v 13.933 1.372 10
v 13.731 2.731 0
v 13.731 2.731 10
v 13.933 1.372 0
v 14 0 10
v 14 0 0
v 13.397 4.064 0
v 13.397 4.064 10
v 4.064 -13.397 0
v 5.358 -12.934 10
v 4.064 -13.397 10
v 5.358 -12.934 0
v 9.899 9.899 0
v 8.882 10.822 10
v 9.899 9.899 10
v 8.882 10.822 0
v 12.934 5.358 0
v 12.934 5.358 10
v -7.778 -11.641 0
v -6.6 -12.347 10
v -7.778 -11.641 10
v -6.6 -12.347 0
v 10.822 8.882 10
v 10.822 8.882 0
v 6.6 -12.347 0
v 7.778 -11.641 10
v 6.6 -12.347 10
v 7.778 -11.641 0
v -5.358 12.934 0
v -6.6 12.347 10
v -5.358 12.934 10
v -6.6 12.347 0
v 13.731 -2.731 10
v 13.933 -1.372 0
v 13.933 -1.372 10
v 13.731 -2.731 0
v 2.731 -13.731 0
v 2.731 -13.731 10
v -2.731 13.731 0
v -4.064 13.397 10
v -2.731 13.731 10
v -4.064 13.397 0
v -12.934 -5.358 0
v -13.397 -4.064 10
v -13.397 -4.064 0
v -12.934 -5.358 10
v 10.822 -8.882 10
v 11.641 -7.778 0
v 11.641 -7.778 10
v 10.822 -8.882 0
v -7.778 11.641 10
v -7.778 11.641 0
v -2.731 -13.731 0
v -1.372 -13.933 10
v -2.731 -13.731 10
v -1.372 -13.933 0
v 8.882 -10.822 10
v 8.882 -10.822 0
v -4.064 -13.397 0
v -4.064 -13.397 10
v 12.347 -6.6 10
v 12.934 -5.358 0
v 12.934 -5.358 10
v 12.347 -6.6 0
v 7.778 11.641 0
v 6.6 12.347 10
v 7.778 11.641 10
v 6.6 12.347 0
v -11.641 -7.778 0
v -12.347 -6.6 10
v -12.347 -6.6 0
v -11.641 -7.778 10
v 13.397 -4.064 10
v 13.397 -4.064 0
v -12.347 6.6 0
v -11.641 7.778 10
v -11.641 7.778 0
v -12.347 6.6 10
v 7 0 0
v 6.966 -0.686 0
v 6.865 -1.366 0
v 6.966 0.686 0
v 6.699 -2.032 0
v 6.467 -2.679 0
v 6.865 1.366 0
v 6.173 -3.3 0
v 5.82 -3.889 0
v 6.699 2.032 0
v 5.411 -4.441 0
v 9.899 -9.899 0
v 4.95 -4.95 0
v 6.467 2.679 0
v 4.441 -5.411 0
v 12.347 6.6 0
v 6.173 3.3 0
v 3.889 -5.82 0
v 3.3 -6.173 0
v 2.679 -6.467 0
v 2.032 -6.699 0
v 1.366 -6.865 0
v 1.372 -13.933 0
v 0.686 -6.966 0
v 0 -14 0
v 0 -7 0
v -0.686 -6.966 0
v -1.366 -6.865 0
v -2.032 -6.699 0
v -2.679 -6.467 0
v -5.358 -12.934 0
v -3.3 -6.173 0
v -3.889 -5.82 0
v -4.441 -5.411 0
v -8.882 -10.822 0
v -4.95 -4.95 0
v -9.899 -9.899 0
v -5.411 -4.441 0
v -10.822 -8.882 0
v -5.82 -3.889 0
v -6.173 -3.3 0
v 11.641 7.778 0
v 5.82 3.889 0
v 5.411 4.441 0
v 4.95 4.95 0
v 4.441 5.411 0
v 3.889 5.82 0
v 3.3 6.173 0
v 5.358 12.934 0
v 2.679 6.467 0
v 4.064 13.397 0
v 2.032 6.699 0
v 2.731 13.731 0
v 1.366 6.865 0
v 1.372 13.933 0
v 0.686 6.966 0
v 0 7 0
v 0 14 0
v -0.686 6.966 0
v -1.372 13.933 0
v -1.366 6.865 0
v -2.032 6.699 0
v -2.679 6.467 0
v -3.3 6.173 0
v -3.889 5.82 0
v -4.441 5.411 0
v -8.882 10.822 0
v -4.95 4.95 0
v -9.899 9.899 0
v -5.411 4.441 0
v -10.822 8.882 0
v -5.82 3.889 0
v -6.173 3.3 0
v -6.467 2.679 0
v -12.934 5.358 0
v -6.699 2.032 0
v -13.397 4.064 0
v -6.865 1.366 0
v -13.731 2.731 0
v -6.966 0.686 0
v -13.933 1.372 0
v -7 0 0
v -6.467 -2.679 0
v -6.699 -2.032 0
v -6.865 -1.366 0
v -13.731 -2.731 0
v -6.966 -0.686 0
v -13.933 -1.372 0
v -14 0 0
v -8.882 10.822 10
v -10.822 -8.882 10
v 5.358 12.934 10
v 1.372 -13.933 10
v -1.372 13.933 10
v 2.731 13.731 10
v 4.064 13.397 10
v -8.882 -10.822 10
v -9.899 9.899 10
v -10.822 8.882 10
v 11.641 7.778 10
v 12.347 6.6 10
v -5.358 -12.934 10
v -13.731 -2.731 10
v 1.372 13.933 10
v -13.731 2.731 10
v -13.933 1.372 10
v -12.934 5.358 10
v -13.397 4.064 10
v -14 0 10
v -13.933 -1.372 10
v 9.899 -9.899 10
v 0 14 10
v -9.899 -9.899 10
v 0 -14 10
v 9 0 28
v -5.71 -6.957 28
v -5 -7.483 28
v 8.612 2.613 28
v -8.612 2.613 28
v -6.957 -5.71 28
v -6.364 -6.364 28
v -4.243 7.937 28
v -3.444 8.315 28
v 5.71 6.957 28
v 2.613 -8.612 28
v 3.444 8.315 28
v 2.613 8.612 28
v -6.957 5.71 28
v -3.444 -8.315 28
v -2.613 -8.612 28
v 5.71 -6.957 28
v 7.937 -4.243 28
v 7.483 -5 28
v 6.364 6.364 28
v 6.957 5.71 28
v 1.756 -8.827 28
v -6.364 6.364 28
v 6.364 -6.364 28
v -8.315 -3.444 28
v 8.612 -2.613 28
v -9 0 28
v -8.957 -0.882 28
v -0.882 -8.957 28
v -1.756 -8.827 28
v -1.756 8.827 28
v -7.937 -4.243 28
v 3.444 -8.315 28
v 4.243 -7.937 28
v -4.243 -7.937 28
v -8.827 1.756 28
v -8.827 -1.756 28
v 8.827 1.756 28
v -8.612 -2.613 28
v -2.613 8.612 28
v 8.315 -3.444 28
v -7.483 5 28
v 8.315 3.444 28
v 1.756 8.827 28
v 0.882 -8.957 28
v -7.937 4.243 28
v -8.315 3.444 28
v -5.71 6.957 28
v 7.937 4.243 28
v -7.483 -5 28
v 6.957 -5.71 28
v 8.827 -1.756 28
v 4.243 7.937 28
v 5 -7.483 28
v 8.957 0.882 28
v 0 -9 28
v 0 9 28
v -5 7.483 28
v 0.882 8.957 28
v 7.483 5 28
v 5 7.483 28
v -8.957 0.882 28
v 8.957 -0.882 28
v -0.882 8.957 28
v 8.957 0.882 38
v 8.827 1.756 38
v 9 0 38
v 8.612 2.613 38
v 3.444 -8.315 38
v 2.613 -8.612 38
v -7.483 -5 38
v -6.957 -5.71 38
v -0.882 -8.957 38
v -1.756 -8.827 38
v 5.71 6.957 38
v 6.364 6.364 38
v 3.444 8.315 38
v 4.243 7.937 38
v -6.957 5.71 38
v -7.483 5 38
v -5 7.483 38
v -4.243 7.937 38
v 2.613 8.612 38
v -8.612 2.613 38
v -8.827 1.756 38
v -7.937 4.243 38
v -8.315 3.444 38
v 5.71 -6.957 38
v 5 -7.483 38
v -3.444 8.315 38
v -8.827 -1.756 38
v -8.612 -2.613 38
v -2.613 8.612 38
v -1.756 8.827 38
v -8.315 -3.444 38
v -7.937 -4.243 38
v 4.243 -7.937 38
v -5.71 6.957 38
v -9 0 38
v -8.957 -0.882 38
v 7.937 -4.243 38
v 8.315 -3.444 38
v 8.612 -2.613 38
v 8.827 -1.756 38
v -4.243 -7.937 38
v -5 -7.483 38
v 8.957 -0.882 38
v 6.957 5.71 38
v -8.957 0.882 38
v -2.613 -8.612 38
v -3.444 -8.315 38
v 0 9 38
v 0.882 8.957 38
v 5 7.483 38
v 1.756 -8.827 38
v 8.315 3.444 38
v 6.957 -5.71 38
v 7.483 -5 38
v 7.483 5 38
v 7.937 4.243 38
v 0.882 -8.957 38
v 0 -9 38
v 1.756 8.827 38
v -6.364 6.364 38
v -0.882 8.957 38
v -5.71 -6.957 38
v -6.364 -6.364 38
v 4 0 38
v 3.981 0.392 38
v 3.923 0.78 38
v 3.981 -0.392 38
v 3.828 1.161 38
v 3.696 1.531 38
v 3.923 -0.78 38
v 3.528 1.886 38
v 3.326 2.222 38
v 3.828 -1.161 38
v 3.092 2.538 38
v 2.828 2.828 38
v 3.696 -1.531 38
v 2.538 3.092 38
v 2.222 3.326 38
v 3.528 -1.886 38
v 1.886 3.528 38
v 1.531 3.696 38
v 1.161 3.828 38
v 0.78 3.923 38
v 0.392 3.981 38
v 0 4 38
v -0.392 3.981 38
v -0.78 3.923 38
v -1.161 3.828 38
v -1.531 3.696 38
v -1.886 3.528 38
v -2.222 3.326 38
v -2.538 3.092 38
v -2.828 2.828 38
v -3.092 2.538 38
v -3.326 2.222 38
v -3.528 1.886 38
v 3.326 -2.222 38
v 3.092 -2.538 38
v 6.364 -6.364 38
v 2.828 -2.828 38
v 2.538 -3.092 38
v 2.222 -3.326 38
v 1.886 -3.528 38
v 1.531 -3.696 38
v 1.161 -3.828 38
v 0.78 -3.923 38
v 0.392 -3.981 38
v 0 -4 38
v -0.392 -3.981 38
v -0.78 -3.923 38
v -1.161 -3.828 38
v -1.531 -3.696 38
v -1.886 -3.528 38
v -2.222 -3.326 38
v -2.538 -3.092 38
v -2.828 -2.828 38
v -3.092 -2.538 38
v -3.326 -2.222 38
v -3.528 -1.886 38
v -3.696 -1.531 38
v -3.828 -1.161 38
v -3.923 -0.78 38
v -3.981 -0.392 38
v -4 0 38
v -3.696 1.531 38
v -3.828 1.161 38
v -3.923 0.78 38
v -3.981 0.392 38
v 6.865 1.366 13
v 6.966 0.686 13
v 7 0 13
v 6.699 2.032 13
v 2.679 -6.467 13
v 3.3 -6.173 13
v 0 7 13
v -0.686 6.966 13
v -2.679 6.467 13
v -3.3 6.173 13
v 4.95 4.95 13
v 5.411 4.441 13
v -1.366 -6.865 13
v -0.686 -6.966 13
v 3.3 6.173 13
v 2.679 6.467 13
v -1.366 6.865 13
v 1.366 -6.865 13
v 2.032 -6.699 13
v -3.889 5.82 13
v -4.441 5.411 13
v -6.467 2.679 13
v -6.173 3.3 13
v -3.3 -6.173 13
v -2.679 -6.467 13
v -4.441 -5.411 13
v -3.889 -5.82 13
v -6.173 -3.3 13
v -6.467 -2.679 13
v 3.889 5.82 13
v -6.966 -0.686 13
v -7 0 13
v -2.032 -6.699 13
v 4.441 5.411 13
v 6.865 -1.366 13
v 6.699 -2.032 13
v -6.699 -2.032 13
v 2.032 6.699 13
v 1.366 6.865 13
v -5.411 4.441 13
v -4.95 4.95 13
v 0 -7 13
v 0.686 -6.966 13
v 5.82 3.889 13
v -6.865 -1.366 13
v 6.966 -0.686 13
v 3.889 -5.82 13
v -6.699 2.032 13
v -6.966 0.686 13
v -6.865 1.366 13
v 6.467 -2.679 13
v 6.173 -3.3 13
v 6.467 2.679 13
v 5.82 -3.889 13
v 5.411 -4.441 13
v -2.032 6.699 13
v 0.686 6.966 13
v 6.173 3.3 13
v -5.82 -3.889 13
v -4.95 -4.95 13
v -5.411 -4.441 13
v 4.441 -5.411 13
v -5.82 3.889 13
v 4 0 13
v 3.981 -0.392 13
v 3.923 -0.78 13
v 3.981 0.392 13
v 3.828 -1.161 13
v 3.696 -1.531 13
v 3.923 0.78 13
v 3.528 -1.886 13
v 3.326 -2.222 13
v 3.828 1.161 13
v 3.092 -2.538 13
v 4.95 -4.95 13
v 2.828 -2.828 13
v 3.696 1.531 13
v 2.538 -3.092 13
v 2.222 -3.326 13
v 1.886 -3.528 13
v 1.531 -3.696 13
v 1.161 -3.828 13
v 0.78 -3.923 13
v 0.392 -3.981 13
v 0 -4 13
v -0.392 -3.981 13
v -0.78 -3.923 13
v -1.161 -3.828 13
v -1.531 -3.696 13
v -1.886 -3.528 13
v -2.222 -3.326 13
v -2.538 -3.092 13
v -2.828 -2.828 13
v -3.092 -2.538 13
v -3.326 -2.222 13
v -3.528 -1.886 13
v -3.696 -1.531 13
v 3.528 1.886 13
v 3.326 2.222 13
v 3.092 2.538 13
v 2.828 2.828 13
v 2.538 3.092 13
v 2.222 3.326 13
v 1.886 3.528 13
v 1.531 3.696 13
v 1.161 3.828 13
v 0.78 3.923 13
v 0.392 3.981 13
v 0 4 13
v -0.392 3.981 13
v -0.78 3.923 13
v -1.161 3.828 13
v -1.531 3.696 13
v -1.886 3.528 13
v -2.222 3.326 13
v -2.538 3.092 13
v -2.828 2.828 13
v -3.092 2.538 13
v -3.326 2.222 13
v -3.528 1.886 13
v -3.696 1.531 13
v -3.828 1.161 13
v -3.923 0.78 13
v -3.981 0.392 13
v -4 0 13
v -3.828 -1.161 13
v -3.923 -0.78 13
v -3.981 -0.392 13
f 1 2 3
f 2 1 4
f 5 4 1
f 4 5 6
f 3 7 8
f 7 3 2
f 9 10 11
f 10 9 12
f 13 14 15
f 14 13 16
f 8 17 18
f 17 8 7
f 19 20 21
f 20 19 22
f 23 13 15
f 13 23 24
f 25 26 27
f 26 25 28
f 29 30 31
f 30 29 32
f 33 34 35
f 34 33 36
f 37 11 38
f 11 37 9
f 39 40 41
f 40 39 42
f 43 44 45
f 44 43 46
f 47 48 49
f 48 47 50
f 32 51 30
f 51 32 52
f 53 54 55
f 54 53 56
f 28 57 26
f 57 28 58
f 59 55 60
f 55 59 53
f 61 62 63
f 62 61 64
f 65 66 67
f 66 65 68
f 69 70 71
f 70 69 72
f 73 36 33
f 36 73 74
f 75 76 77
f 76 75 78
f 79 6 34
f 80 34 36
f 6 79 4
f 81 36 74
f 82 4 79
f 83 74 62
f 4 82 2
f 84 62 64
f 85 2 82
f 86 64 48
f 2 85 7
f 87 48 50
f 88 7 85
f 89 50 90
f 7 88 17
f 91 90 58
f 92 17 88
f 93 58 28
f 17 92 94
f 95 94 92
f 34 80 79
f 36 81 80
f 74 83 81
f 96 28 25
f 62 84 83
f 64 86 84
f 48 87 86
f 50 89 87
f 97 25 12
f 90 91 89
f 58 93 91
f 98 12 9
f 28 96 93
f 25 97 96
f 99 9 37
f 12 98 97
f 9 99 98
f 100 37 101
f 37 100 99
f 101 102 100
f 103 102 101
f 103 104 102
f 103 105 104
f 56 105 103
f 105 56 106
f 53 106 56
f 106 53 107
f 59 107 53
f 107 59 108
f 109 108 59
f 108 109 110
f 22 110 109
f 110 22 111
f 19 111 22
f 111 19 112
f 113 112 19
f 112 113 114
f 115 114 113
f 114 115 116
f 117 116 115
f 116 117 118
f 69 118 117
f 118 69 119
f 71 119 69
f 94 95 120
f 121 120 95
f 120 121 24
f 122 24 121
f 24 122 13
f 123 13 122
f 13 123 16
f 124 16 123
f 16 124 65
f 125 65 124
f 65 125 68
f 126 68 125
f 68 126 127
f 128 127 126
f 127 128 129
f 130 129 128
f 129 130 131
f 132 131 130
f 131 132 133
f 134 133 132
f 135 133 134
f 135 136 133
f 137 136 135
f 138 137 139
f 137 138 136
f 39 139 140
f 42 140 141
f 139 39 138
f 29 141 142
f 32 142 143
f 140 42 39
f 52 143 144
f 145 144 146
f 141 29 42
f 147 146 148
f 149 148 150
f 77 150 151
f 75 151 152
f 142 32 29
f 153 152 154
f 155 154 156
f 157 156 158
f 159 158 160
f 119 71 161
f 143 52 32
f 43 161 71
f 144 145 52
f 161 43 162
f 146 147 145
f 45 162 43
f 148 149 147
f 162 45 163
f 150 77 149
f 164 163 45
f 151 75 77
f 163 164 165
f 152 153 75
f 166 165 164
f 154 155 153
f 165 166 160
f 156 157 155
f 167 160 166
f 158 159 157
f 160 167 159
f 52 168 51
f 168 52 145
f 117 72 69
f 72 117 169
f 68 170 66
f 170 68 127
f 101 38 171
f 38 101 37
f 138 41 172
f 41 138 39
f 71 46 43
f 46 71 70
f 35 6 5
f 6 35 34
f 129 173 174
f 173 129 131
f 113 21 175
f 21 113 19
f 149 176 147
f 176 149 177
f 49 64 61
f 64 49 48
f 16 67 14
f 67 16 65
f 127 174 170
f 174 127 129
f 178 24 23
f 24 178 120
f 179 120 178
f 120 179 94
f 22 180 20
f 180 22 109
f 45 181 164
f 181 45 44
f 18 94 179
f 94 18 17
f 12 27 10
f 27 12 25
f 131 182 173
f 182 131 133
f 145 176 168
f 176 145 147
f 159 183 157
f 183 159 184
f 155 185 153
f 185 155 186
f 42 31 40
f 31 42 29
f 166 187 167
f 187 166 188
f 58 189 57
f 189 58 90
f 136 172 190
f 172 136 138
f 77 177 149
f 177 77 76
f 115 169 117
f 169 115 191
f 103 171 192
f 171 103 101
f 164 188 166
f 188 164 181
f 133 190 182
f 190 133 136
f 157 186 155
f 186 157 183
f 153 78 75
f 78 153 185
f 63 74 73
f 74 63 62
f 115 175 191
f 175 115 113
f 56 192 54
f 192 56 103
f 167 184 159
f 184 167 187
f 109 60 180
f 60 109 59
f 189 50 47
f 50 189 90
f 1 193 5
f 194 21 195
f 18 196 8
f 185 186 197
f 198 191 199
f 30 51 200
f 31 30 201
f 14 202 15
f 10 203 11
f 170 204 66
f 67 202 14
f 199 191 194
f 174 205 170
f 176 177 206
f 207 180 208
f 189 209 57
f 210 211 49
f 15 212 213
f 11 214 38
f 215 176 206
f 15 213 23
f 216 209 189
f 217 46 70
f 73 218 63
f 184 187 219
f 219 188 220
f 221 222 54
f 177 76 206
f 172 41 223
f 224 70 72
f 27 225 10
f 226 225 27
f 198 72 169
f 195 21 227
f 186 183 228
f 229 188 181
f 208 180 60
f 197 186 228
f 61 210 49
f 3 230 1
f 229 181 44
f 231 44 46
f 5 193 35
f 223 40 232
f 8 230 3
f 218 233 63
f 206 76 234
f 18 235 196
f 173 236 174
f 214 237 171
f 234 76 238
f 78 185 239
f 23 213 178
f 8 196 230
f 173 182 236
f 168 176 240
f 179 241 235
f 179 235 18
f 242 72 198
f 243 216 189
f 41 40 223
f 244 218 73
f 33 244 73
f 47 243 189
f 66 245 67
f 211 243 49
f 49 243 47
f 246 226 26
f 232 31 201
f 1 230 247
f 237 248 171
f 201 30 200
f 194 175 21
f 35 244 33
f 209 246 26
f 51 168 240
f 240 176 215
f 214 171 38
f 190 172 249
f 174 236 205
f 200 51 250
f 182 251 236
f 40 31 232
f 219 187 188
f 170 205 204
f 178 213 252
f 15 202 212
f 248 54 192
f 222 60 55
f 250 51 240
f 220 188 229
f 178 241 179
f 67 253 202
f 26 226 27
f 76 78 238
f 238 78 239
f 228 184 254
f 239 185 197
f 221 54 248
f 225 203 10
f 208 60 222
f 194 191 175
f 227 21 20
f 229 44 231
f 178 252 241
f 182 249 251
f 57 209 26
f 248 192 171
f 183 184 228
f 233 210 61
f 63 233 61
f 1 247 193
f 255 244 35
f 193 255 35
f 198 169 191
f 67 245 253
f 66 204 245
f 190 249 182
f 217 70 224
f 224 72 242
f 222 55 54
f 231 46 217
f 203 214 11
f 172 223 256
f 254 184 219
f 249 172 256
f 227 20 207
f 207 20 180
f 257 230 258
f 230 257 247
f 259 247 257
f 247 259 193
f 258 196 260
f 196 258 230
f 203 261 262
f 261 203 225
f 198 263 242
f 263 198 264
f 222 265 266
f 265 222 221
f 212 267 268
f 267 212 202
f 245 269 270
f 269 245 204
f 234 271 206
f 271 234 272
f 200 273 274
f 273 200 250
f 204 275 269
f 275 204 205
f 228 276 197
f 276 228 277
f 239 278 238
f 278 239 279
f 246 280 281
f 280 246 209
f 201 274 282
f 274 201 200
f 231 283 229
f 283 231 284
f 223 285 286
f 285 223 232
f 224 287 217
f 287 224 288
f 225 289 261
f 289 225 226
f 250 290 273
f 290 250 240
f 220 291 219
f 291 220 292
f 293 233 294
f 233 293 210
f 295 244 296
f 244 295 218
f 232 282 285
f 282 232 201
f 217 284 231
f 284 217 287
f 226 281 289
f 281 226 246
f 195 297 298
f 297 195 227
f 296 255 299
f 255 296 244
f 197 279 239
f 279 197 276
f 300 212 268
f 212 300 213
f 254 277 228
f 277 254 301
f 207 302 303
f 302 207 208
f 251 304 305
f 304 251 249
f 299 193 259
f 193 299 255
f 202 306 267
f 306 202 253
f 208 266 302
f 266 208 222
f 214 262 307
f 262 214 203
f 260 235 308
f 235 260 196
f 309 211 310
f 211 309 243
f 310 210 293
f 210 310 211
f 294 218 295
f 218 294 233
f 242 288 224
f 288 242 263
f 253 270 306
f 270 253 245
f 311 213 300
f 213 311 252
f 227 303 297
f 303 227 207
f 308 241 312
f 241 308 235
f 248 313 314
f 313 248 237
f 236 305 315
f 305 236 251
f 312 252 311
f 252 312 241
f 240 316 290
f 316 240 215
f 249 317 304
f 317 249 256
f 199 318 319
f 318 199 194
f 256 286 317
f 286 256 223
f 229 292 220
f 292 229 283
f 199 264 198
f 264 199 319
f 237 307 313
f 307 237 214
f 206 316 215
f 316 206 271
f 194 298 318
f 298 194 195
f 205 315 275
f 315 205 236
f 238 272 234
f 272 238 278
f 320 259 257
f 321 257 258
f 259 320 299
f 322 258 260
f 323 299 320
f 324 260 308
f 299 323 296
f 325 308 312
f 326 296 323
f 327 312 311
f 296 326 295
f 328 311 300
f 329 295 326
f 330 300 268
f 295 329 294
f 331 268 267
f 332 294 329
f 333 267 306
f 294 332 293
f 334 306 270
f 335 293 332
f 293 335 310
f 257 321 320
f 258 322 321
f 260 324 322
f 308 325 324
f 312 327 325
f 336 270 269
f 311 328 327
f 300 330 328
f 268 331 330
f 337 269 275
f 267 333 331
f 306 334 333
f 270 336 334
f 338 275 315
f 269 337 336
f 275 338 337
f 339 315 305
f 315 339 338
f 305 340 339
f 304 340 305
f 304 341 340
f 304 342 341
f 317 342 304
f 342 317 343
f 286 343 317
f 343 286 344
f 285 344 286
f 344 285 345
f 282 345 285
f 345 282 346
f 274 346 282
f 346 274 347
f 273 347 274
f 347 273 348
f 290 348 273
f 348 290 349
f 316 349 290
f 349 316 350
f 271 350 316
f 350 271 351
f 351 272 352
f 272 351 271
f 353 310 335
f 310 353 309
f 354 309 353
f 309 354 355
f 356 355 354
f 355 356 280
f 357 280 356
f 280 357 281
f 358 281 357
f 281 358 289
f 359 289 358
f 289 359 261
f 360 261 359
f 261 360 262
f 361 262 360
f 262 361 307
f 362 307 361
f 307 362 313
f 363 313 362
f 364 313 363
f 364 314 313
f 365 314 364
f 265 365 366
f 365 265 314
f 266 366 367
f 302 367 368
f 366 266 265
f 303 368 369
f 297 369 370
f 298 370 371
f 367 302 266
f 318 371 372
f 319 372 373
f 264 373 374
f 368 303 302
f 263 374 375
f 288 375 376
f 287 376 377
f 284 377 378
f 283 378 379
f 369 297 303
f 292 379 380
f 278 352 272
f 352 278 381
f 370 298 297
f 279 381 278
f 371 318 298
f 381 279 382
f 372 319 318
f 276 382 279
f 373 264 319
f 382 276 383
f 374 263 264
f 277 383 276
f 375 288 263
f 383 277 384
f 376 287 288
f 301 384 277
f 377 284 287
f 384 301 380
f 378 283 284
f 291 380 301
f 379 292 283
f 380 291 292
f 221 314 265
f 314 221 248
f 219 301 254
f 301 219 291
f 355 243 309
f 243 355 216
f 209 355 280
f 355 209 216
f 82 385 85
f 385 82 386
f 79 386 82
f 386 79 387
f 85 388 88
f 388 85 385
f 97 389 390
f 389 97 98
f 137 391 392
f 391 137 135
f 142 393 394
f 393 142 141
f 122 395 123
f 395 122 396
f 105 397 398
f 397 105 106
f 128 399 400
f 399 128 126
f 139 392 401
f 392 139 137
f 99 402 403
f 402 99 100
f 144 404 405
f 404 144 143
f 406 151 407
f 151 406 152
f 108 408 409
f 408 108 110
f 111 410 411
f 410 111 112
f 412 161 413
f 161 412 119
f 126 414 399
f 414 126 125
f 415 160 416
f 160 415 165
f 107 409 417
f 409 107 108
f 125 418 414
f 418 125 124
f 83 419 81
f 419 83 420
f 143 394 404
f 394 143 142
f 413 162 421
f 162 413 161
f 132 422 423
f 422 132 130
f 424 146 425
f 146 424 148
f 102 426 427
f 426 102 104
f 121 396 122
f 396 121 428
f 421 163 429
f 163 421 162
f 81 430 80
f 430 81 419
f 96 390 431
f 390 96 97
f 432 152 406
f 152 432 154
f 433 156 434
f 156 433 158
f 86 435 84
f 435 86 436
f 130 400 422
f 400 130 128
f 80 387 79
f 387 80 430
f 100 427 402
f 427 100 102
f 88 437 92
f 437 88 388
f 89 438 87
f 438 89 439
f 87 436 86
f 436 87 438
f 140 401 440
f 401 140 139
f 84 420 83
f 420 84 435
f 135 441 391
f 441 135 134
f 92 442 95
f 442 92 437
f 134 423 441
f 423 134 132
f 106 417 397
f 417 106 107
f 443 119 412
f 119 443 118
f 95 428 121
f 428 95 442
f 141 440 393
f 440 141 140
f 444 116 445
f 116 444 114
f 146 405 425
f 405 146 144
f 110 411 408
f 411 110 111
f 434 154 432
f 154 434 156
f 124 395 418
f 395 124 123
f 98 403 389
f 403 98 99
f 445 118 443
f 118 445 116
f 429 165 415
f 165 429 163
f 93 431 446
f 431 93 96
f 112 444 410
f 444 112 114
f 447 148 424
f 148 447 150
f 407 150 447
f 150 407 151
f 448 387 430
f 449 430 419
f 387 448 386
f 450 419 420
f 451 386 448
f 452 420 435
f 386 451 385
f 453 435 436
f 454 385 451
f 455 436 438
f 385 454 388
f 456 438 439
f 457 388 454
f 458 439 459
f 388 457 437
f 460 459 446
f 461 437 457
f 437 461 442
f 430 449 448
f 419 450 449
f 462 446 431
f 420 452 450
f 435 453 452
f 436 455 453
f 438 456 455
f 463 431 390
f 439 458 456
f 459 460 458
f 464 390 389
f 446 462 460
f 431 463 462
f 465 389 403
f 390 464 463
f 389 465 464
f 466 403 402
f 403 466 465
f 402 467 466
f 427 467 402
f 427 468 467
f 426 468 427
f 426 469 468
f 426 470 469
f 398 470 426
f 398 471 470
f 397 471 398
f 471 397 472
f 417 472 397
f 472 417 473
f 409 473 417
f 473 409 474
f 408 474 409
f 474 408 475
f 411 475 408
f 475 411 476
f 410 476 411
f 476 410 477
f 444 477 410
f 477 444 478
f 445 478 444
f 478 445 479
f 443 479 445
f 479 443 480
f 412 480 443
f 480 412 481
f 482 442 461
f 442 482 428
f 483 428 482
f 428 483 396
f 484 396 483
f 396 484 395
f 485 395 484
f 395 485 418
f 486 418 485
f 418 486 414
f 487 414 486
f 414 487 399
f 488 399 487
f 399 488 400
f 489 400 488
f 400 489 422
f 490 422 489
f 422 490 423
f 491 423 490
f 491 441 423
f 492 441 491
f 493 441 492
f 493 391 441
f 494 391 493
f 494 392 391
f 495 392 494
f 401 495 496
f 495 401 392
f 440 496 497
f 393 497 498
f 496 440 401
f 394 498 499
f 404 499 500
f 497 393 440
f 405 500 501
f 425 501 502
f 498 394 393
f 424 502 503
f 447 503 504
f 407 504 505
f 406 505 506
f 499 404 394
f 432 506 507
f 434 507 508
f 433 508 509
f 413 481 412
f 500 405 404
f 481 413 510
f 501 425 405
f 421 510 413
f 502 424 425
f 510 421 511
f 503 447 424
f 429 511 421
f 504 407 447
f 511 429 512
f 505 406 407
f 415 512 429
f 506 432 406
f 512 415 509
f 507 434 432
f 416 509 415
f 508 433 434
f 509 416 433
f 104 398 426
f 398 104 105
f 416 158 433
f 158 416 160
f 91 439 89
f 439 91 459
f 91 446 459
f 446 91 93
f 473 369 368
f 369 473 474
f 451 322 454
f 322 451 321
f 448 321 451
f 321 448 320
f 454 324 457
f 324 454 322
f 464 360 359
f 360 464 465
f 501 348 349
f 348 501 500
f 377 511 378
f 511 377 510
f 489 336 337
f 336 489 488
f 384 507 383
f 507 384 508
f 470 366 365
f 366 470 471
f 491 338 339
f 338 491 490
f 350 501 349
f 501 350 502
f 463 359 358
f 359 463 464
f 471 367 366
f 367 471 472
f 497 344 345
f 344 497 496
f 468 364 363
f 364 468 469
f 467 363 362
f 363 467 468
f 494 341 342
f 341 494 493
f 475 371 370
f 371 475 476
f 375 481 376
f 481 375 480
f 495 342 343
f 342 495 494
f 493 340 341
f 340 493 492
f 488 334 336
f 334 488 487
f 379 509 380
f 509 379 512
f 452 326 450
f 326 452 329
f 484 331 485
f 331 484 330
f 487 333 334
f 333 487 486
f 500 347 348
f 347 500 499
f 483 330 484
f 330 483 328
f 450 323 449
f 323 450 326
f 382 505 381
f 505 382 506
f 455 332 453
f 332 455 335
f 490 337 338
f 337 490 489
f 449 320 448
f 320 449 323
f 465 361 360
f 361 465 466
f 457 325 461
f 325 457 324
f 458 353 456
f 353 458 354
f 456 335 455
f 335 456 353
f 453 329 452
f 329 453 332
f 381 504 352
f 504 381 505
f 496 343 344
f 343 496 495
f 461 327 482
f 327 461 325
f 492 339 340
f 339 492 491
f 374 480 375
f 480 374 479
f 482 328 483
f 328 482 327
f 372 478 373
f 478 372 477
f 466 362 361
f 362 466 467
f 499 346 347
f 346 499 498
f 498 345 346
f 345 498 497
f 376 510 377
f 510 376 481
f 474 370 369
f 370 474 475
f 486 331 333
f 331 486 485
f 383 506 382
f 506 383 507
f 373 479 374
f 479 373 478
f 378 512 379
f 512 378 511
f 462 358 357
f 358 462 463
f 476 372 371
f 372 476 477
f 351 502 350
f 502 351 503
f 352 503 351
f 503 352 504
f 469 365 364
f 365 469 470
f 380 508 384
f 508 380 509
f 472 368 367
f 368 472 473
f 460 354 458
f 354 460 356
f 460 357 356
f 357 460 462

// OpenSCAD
// Starter nozzle for task-012.
$fn = 64;

lower_height = 10;
taper_height = 18;
neck_height = 10;
exit_chamfer_height = 0;

lower_od = 28;
middle_od = 18;
exit_od = 12;

bottom_bore_diameter = 14;
middle_bore_diameter = 8;
exit_bore_diameter = 5;
bore_lower_height = 12;
side_hole_diameter = 0;

total_height = lower_height + taper_height + neck_height + exit_chamfer_height;

difference() {
  union() {
    cylinder(h = lower_height, r = lower_od / 2);

    translate([0, 0, lower_height])
      cylinder(h = taper_height, r1 = lower_od / 2, r2 = middle_od / 2);

    translate([0, 0, lower_height + taper_height])
      cylinder(h = neck_height, r = middle_od / 2);

    if (exit_chamfer_height > 0) {
      translate([0, 0, lower_height + taper_height + neck_height])
        cylinder(h = exit_chamfer_height, r1 = middle_od / 2, r2 = exit_od / 2);
    }
  }

  translate([0, 0, -1])
    cylinder(h = bore_lower_height + 2, r = bottom_bore_diameter / 2);

  translate([0, 0, bore_lower_height])
    cylinder(h = max(total_height - bore_lower_height - exit_chamfer_height + 1, 1), r = middle_bore_diameter / 2);

  if (exit_chamfer_height > 0) {
    translate([0, 0, total_height - exit_chamfer_height])
      cylinder(h = exit_chamfer_height + 1, r1 = middle_bore_diameter / 2, r2 = exit_bore_diameter / 2);
  }

  if (side_hole_diameter > 0) {
    translate([-20, 0, 18])
      rotate([0, 90, 0])
        cylinder(h = 40, d = side_hole_diameter);
  }
}
